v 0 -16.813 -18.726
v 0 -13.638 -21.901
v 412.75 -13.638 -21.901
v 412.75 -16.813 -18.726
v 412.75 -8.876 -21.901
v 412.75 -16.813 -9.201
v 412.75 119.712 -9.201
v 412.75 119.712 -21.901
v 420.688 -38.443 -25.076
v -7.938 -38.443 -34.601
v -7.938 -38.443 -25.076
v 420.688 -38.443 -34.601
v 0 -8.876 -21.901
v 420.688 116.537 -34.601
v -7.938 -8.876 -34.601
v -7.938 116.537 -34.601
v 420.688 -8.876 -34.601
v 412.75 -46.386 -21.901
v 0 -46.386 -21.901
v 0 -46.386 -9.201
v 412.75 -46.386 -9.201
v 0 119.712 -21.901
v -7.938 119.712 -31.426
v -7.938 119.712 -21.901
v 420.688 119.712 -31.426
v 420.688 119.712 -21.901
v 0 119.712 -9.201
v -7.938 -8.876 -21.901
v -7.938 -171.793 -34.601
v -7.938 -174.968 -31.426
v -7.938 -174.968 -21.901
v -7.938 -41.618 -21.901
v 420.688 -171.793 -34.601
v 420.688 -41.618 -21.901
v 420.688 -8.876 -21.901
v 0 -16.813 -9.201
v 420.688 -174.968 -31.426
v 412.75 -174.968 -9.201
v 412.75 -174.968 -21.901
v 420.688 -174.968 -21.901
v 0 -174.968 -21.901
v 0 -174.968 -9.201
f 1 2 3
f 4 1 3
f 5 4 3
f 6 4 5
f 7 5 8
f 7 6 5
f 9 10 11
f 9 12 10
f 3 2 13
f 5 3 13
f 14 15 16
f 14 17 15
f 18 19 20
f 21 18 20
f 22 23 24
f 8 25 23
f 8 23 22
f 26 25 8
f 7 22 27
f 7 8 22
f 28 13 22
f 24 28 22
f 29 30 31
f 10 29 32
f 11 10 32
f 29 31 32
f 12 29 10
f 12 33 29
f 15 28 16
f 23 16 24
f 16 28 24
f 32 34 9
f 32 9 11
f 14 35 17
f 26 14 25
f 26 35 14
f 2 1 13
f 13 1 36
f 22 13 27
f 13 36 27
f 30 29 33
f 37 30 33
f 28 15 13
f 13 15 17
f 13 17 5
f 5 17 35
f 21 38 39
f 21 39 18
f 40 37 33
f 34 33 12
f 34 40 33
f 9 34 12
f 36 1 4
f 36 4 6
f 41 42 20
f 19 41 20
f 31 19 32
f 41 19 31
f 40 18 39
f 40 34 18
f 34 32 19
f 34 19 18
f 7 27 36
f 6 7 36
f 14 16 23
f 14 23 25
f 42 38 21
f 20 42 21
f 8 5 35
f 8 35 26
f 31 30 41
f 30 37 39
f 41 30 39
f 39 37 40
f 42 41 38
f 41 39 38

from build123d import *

# Parameters (mm, degrees)
F0_W          = 128.5875
F0_H          = 12.7
F0_W_2        = 7.9375
F0_W_3        = 128.58242
F1_DEPTH      = 412.75
F2_DEPTH      = 420.6875
F2_DEPTH_BACK = 7.9375
F0_W_4        = 7.94258
F3_DEPTH      = 420.6875
F3_DEPTH_BACK = 7.9375
F4_SIZE       = 3.175


with BuildPart() as f1:
    # F0 (on Right) → F1 (new body)
    with BuildSketch(Plane.YZ):
        with Locations((55.41789, -15.551377)):
            Rectangle(F0_W, F0_H)
        with Locations((-12.84461, -15.551377)):
            Rectangle(F0_W_2, F0_H)
        with Locations((-110.677167, -15.551377)):
            Rectangle(F0_W_3, F0_H)
    extrude(amount=F1_DEPTH)

    # F0 (on Right) → F2 (join, two sides)
    with BuildSketch(Plane.YZ) as f2_sk:
        with Locations((55.41789, -28.251377)):
            Rectangle(F0_W, F0_H)
    extrude(amount=F2_DEPTH)
    extrude(f2_sk.sketch, amount=-F2_DEPTH_BACK)

    # F0 (on Right) → F3 (join, two sides)
    with BuildSketch(Plane.YZ) as f3_sk:
        with Locations((-110.677167, -28.251377)):
            Rectangle(F0_W_3, F0_H)
        with Locations((-42.414667, -28.251377)):
            Rectangle(F0_W_4, F0_H)
    extrude(amount=F3_DEPTH)
    extrude(f3_sk.sketch, amount=-F3_DEPTH_BACK)

    # F4
    f4_edges = [f1.edges().sort_by_distance(p)[0] for p in [
        (206.375, -38.443377, -21.901377),
        (206.375, -16.81336, -21.901377),
        (206.375, 119.71164, -34.601377),
        (206.375, -174.968377, -34.601377),
    ]]
    chamfer(f4_edges, length=F4_SIZE)


solid = f1.part
